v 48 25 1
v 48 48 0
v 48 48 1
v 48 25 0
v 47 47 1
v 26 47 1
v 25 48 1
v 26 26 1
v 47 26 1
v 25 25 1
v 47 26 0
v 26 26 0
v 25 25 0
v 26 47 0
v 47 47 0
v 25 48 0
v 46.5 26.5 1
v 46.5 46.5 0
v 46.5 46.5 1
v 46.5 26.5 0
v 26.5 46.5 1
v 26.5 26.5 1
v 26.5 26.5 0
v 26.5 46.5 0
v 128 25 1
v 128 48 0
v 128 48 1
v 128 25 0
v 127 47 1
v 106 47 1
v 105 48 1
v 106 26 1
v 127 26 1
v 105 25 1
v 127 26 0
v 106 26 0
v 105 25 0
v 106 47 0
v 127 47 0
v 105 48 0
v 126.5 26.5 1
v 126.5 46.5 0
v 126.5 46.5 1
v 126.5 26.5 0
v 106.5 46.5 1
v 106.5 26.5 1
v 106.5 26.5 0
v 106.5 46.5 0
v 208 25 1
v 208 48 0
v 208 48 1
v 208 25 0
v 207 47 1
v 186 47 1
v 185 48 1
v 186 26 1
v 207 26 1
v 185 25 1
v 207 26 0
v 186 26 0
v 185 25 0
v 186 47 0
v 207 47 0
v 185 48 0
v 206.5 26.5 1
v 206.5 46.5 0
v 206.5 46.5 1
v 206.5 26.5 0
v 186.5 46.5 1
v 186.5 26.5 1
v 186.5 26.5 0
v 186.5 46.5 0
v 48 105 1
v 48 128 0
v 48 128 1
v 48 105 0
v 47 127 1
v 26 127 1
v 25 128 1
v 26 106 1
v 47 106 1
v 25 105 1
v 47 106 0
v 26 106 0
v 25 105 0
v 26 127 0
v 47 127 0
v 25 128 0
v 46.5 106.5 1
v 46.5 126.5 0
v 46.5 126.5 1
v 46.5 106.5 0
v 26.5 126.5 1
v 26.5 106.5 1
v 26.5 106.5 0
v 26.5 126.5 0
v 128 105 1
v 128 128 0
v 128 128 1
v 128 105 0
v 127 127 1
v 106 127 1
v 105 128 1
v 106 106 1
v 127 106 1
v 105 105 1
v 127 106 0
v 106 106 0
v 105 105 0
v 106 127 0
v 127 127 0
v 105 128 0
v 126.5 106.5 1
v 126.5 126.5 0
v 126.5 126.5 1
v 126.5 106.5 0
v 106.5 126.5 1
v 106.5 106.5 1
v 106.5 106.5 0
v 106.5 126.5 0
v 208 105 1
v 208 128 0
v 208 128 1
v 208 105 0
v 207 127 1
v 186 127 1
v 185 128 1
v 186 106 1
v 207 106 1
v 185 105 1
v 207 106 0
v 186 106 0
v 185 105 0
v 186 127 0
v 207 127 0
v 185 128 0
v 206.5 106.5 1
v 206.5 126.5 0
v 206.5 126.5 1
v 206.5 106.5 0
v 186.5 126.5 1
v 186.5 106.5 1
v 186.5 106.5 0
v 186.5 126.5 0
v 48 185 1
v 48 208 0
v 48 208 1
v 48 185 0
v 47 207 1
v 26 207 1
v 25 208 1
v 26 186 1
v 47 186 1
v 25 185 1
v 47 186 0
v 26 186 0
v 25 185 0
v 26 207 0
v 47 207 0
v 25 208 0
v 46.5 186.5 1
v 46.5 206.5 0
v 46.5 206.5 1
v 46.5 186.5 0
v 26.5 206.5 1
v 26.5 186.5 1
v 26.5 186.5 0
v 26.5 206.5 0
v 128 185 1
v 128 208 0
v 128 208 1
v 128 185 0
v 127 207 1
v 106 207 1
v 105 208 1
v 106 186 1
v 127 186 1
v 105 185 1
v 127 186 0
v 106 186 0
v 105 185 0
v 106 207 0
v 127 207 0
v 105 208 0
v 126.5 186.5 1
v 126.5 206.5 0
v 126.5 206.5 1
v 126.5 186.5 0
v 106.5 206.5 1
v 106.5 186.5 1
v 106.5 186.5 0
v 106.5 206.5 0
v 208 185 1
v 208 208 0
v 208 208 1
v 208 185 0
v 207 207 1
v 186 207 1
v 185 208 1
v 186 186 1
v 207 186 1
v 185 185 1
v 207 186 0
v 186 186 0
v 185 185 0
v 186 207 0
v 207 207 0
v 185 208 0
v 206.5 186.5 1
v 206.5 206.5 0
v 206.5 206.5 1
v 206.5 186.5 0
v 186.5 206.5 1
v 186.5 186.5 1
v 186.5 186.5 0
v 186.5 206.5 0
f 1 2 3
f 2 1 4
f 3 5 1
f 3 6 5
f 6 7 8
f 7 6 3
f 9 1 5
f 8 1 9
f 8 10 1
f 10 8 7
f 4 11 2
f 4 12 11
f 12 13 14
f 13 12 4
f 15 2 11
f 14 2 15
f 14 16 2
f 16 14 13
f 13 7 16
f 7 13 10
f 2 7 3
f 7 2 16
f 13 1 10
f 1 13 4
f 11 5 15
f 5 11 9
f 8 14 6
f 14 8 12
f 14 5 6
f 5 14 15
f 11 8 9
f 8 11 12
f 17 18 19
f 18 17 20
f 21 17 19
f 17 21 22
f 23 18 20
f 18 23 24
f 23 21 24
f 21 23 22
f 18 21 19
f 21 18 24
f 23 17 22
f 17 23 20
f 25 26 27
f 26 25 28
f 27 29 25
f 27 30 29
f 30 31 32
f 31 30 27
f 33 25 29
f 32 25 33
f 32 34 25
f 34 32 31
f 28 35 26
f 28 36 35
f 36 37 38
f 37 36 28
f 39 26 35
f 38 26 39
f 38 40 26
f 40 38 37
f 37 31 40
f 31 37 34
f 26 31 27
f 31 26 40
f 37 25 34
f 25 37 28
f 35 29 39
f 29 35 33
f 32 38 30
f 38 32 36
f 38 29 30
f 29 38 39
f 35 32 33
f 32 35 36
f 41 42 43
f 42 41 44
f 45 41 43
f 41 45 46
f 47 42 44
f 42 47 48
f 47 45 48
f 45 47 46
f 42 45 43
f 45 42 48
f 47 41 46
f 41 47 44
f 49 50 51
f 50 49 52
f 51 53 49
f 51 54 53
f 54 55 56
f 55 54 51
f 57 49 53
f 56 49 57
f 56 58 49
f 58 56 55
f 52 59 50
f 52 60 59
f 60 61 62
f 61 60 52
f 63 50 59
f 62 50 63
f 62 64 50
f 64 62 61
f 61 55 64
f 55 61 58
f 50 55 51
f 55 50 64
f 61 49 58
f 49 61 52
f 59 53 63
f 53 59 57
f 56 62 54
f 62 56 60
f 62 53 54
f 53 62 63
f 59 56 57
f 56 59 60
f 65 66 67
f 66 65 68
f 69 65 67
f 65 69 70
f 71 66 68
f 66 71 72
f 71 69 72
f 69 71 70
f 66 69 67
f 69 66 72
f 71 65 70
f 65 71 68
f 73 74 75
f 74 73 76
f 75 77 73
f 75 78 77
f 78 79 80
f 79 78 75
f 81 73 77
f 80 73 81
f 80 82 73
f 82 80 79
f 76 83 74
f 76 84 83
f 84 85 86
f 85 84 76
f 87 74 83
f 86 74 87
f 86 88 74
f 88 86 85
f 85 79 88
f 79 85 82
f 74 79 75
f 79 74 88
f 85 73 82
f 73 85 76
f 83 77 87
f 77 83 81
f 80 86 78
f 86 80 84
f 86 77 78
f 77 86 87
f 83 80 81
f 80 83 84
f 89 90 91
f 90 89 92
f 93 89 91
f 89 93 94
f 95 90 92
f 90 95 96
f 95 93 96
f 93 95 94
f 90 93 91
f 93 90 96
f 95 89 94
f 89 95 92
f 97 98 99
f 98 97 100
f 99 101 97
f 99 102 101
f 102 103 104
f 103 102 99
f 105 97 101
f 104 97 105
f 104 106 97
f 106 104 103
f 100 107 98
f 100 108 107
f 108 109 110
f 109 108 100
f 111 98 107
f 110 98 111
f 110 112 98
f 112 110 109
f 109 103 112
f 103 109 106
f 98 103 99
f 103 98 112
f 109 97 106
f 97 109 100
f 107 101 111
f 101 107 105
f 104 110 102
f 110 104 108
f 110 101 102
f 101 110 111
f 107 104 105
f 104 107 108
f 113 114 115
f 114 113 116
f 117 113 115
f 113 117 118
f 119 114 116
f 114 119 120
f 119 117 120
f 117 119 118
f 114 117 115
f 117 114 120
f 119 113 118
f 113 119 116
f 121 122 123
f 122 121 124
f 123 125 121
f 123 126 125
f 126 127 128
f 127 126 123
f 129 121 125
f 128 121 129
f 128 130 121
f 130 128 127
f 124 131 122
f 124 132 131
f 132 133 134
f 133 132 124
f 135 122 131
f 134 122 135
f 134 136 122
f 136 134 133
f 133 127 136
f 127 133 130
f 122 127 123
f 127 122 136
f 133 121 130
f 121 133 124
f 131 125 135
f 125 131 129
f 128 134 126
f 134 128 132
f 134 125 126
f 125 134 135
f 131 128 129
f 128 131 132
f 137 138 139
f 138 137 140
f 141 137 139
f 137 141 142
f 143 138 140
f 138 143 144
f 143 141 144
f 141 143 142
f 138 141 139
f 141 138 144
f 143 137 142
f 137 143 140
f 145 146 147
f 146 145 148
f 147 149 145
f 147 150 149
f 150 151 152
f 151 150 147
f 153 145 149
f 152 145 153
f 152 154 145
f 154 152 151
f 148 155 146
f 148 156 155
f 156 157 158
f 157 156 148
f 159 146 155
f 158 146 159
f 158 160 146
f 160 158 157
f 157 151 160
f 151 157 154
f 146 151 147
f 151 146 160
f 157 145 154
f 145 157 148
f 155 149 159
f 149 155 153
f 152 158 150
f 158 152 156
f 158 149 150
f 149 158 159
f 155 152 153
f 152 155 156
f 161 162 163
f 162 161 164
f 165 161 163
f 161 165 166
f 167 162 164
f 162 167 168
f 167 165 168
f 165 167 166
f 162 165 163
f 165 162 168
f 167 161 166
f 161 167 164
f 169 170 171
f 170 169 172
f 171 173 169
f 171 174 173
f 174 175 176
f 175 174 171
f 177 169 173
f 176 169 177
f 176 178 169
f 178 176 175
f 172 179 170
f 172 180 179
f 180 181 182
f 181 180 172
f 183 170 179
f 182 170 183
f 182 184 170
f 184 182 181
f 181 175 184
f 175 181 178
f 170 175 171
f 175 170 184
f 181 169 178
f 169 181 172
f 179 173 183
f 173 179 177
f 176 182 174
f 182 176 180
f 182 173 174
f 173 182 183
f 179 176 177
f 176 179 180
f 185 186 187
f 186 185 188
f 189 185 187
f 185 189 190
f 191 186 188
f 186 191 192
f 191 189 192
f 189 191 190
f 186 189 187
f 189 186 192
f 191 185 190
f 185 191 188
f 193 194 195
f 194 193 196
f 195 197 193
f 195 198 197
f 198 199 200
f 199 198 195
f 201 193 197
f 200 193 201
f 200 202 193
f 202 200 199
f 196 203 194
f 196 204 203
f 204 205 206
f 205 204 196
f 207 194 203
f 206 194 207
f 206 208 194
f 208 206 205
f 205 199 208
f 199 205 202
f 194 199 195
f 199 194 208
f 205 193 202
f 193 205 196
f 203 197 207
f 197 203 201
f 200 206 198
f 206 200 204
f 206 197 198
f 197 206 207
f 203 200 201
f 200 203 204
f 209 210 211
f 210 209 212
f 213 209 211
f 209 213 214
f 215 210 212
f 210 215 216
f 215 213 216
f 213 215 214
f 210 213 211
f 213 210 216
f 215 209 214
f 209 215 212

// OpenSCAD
/**
 * Print designed to check that you bed is level
 *
 * print four small squares in each corner to ensure even print quality and good adhesion.
 
 Übernommen von https://www.thingiverse.com/thing:34558
 
 */

// Define your printers printable area
// If you are using Sprinter firmware then these come directly from configuration.h

X_MAX_LENGTH = 230;
Y_MAX_LENGTH = 230;

THICKNESS = 1.0; //Square / outline thickness
SIZE = 20; //Square width / height
GAP = 0.5; //Width of border between square and parameter
OUTLINE_WIDTH = 1; //Width of parameter around square
OFFSET = 25; //Offset from limits in each axis

translate([OFFSET, OFFSET, 0]) square(); //Top Left
translate([(X_MAX_LENGTH / 2) - (SIZE / 2), OFFSET, 0]) square(); //Top Middle
translate([X_MAX_LENGTH - OFFSET - SIZE, OFFSET, 0]) square(); //Top Right

translate([OFFSET, (Y_MAX_LENGTH / 2) - (SIZE / 2), 0]) square(); //Middle Left
translate([(X_MAX_LENGTH / 2) - (SIZE / 2), (Y_MAX_LENGTH / 2) - (SIZE / 2), 0]) square(); //Middle Middle
translate([X_MAX_LENGTH - OFFSET - SIZE, (Y_MAX_LENGTH / 2) - (SIZE / 2), 0]) square(); //Middle Right

translate([OFFSET, Y_MAX_LENGTH - OFFSET - SIZE, 0]) square(); //Bottom Left
translate([(X_MAX_LENGTH / 2) - (SIZE / 2), Y_MAX_LENGTH - OFFSET - SIZE, 0]) square(); //Bottom Middle
translate([X_MAX_LENGTH - OFFSET - SIZE, Y_MAX_LENGTH - OFFSET - SIZE, 0]) square(); //Bottom Right

module square() {
	//Center square
	translate([
				OUTLINE_WIDTH + GAP,
				OUTLINE_WIDTH + GAP,
				0
			])
		cube([SIZE, SIZE, THICKNESS]);

	//Parameter
	difference() {
		//Outer square
		cube([
				SIZE + (2 * (GAP + OUTLINE_WIDTH)),
				SIZE + (2 * (GAP + OUTLINE_WIDTH)),
				THICKNESS
			]);

		//Inner square
		translate([OUTLINE_WIDTH, OUTLINE_WIDTH, -5])
			cube([SIZE + (2 * GAP), SIZE + (2 * GAP), 10]);
	}
}
